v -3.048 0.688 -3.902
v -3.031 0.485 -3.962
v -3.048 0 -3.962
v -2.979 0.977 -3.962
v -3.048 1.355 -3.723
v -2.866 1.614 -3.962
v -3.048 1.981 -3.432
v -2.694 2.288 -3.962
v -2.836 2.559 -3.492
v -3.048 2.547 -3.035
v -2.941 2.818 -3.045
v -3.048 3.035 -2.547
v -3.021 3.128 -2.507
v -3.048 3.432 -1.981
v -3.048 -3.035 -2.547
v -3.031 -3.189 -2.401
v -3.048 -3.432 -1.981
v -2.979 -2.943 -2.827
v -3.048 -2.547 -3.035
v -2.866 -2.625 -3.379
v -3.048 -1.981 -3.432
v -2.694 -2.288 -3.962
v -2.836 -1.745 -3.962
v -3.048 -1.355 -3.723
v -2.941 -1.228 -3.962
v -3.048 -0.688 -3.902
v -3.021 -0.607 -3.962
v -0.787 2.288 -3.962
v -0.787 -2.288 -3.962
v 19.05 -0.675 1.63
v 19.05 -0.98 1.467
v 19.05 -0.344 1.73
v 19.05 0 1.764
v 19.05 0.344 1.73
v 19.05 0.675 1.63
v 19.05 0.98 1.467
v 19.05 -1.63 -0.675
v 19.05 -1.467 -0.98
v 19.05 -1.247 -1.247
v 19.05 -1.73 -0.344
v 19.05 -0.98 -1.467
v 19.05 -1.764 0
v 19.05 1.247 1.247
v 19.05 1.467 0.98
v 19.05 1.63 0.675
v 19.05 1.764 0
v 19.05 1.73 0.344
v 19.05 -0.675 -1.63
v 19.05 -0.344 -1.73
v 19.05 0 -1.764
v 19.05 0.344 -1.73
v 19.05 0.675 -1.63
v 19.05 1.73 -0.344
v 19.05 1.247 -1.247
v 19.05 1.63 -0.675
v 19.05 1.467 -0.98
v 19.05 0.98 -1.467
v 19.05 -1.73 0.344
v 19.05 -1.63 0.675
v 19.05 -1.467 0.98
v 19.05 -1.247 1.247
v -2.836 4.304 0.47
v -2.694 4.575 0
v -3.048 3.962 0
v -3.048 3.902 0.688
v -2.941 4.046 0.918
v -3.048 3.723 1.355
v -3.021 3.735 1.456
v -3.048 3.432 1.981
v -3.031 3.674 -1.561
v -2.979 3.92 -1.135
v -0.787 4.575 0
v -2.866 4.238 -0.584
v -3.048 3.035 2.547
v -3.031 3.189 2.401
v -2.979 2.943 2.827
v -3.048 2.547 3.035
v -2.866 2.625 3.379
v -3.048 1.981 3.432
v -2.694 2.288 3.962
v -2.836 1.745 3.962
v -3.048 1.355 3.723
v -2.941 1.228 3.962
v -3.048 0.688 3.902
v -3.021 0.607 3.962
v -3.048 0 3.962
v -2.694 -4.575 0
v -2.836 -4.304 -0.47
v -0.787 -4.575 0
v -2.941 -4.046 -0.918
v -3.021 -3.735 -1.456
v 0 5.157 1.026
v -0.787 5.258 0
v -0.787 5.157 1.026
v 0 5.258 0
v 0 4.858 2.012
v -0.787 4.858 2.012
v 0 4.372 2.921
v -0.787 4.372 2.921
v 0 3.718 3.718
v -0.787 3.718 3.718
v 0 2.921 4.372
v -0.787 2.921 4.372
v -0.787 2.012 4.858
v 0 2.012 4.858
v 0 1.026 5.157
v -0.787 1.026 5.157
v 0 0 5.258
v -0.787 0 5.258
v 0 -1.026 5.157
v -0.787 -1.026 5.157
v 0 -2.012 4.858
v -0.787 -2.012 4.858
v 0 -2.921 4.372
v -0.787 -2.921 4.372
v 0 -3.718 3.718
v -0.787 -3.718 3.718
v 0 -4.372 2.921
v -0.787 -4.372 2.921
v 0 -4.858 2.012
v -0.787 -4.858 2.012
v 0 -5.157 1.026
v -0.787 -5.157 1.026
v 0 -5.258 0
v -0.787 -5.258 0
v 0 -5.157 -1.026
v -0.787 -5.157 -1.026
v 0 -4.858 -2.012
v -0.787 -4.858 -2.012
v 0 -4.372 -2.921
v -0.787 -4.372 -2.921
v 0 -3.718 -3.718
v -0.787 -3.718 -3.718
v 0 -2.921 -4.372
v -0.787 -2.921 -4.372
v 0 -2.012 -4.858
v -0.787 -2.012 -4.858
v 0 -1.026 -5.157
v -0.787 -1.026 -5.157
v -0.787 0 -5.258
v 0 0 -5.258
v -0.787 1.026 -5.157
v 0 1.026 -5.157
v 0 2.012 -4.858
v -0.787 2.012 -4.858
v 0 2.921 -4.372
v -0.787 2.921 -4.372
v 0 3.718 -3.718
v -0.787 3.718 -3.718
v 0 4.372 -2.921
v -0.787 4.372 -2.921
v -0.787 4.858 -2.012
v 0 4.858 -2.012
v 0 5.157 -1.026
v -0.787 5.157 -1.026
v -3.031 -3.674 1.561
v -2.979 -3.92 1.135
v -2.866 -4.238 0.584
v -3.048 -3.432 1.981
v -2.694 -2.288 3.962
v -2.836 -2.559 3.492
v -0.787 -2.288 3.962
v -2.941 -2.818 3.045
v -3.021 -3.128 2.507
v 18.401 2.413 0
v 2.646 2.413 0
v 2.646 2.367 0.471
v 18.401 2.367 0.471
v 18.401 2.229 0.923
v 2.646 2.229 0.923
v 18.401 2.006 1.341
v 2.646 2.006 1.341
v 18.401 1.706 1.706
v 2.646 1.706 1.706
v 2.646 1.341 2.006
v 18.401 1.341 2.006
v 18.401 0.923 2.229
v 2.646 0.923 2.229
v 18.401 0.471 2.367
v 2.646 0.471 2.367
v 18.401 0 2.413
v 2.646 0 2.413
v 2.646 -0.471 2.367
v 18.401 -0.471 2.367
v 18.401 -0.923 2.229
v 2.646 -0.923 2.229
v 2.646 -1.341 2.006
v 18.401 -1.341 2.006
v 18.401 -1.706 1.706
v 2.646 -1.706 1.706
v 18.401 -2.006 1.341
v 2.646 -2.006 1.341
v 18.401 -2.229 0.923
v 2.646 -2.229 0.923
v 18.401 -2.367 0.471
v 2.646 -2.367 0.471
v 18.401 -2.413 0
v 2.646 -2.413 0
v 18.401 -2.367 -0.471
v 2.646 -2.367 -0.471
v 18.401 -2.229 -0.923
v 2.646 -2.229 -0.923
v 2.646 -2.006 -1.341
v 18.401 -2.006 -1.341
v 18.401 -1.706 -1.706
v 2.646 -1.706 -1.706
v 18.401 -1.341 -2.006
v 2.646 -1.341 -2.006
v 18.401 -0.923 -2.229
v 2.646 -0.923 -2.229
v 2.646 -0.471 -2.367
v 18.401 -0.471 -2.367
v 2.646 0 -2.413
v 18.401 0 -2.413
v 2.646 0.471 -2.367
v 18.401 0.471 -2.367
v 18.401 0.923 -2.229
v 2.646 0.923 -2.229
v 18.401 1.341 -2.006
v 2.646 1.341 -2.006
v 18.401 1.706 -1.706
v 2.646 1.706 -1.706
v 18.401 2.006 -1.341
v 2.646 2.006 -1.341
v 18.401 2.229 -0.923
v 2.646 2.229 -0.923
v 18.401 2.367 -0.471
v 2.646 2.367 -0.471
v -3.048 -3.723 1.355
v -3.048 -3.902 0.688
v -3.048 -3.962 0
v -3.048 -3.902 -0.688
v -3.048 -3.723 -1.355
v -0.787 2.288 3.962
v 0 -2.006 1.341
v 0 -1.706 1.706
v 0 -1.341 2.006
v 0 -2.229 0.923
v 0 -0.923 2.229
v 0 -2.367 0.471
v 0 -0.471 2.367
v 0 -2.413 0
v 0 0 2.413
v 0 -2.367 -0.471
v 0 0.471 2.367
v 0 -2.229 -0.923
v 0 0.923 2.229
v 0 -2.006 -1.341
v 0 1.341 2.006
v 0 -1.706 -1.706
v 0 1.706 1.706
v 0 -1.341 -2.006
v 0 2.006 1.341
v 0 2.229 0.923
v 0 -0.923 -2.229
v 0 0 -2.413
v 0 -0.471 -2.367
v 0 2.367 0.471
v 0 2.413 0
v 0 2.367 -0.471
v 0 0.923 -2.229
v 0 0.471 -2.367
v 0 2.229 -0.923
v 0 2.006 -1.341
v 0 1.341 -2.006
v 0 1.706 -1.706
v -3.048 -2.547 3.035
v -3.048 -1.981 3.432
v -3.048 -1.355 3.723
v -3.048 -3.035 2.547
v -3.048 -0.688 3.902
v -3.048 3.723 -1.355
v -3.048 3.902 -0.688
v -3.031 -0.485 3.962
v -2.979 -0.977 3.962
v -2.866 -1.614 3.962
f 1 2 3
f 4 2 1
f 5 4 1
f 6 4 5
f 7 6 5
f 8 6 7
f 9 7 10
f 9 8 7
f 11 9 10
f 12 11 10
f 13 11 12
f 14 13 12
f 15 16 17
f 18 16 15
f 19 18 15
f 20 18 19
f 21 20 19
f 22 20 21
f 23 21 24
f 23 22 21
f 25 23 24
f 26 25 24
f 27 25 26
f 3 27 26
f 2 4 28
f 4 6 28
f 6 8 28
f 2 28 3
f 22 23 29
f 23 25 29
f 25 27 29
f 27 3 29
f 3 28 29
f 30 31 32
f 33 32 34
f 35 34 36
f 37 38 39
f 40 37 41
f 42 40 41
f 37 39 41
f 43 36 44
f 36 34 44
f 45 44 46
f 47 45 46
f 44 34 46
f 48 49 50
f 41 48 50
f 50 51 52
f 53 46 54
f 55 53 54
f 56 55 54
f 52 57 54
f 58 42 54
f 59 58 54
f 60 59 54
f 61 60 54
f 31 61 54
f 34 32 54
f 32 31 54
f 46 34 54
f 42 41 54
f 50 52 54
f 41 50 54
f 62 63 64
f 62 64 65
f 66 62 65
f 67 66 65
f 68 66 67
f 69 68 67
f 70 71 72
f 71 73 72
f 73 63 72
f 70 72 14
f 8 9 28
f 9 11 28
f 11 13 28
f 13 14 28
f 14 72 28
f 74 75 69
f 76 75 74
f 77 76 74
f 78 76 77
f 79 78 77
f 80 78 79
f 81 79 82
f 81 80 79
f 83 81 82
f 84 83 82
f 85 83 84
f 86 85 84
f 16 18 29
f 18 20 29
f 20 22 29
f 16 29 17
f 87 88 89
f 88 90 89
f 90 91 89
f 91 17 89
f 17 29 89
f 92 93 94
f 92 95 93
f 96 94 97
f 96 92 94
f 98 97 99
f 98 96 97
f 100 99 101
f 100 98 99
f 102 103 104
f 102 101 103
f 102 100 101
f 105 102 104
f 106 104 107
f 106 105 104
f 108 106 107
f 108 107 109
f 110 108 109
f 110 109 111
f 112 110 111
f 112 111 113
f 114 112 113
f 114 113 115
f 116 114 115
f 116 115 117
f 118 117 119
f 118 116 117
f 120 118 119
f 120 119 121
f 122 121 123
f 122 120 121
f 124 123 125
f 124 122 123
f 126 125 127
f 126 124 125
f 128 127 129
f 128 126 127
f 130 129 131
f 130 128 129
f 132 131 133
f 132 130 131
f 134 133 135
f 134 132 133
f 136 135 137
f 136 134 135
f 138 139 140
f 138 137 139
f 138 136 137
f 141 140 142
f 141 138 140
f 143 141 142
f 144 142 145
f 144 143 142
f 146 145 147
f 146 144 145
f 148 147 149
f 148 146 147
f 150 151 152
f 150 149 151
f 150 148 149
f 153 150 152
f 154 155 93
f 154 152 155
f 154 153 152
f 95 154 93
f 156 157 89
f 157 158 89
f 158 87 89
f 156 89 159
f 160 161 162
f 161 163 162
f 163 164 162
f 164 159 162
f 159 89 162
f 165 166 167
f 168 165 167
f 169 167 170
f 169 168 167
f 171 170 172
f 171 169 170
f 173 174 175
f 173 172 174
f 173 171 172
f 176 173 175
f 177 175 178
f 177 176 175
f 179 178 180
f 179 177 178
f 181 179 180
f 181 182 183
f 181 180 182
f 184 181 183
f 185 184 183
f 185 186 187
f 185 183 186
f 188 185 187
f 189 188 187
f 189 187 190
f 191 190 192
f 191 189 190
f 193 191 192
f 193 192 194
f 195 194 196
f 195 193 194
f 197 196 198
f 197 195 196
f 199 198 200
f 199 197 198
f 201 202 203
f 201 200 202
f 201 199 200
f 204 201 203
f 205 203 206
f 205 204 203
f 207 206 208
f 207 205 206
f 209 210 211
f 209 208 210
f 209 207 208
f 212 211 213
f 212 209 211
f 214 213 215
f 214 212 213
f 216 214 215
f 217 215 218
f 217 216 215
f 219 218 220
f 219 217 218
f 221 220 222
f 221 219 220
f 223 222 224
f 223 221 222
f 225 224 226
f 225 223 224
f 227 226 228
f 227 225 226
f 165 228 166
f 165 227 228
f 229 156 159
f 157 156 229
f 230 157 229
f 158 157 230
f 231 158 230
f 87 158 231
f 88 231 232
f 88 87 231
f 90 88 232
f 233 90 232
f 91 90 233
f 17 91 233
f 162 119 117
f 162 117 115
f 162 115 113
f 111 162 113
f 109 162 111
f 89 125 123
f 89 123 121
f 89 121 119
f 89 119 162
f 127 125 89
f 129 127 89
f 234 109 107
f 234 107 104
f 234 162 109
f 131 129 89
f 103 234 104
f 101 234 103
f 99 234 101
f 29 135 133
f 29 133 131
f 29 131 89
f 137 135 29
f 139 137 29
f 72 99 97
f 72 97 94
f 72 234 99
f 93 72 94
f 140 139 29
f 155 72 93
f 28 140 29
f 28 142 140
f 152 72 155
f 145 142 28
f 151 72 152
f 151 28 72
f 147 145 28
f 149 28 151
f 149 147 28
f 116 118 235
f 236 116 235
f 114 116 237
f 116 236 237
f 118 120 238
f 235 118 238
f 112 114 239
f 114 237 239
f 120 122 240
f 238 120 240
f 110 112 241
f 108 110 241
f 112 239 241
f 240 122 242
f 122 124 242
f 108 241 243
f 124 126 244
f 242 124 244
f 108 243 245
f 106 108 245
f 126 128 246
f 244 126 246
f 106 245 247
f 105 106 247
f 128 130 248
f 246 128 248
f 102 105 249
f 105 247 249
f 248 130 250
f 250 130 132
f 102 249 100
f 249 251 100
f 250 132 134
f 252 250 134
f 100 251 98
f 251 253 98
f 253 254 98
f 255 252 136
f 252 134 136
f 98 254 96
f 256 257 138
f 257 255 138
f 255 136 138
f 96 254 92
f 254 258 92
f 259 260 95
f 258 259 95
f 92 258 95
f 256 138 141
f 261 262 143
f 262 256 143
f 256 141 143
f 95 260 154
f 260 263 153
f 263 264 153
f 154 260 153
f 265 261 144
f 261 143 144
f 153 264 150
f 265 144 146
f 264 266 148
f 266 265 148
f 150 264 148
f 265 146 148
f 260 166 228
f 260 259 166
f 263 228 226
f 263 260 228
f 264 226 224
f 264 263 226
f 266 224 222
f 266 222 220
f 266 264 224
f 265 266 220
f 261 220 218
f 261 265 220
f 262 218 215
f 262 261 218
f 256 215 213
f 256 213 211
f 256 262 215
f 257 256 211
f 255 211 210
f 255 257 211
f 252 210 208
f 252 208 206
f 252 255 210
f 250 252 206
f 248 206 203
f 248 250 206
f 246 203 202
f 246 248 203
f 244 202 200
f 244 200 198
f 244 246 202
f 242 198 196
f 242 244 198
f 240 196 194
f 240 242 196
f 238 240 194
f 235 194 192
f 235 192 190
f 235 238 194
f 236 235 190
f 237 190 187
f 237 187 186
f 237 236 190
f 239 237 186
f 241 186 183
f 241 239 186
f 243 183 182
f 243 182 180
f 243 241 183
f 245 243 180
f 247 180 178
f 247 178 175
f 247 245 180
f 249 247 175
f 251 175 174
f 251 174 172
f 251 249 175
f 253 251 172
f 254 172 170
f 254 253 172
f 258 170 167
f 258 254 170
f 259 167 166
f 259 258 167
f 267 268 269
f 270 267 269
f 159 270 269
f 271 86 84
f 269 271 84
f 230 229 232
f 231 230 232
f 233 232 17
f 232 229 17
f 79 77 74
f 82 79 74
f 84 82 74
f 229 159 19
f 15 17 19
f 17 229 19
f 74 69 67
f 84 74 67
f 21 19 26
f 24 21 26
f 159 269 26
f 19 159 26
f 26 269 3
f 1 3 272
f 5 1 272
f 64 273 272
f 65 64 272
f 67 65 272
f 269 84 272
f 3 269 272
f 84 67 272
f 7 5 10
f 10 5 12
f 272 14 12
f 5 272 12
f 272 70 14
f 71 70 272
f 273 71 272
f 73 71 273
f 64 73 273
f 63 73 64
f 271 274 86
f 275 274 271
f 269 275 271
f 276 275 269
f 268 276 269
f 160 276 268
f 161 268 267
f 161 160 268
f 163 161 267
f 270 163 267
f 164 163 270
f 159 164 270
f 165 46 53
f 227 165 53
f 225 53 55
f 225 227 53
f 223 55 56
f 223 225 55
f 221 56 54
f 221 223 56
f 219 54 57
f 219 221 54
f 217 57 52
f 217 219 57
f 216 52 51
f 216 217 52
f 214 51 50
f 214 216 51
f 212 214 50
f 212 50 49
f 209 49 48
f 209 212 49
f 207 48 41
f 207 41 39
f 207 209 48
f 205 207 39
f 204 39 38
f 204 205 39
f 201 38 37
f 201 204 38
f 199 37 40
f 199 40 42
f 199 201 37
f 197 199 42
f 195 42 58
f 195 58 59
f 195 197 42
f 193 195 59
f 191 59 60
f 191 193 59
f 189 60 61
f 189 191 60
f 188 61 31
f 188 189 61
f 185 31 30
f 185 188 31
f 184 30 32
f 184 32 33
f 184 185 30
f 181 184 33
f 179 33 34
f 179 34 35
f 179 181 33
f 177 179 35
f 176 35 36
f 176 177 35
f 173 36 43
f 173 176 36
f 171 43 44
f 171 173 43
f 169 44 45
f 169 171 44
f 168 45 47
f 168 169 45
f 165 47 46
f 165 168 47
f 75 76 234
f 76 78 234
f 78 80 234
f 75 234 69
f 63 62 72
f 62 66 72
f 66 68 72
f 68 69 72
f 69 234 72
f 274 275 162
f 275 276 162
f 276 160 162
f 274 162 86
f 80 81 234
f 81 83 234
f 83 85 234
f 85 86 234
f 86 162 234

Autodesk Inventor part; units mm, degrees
ref_plane "YZ Plane" through (0, 0, 0) normal (1, 0, 0) x (0, 1, 0)
ref_plane "XZ Plane" through (0, 0, 0) normal (0, 1, 0) x (-1, 0, 0)
sketch "Sketch1" plane through (0, 0, 0) normal (0, 0, 1) x (1, 0, 0)
  line L0 (0, 5.2578) -> (0, 2.413)
  line L1 (2.6458, 2.413) -> (19.05, 2.413)
  line L2 (19.05, 2.413) -> (19.05, 0)
  line L3 (19.05, 0) -> (-0.7874, 0)
  line L4 (0, -1.0516) -> (0, 6.3094) projected
  line L5 (-4.7549, 0) -> (23.0175, 0) projected
  line L6 (-0.7874, 0) -> (-0.7874, 5.2578)
  line L7 (-0.7874, 5.2578) -> (0, 5.2578)
  line L8 (2.6458, 2.413) -> (0, 2.413)
  line L9 (0, 2.413) -> (0, 2.413)
  dimension "d0" = 19.05
  dimension "d1" = 16.4042
  dimension "d2" = 4.826
  dimension "d8" = 0.7874
  dimension "d9" = 10.5156
  dimension "d15" = 4.826
  dimension "d16" = 2.6458
revolve "Body" add sketch "Sketch1" angle 360 about axis through (19.05, 0, 0) along (-1, 0, 0)
sketch "Sketch2" plane through (0, 0, 0) normal (1, 0, 0) x (0, 0, -1)
  circle A0 centre (0, 0) radius 5.2578 projected
  line L0 (0, 4.5754) -> (3.9624, 2.2877)
  line L1 (3.9624, 2.2877) -> (3.9624, -2.2877)
  line L2 (3.9624, -2.2877) -> (0, -4.5754)
  line L3 (0, -4.5754) -> (-3.9624, -2.2877)
  line L4 (-3.9624, -2.2877) -> (-3.9624, 2.2877)
  line L5 (-3.9624, 2.2877) -> (0, 4.5754)
  circle A1 centre (0, 0) radius 5.2578 projected
  dimension "d10" = 7.9248
extrude "Head" add sketch "Sketch2" against normal blind 3.048 contours L0 L1 L2 L3 L4 L5
sketch "Sketch3" plane through (0, 0, 0) normal (0, 0, 1) x (1, 0, 0)
  line L0 (-3.048, 3.9624) -> (-3.048, 4.5754)
  line L1 (-3.048, 4.5754) -> (-2.6941, 4.5754)
  line L2 (-2.6941, 4.5754) -> (-3.048, 3.9624)
  line L3 (-2.0219, 4.5754) -> (-3.048, 4.5754)
  line L4 (-3.048, 4.5754) -> (-3.048, 2.266)
  line L5 (-0.7874, 4.5754) -> (-3.048, 4.5754) projected
  line L6 (-3.048, 4.5754) -> (-3.048, 2.2877) projected
  line L7 (-3.5001, 0) -> (-0.3353, 0) projected
  dimension "d5" = 30
  dimension "d18" = 7.9248
revolve "Chamfer1" cut sketch "Sketch3" angle 360 about axis through (-10, 0, 0) along (1, 0, 0)
thread "Thread" size "10-24 UNC" class "2A" standard "ANSI Unified Screw Threads" length 16.4042
chamfer "Chamfer2" distance 0.6492 distance2 0.6492 1 edges at (19.05, -2.413, 0) measured on face at (19.05, -0.4919, 0.3738)
ref_plane "Work Plane1" through (3.5, 0, 0) normal (0, 0, 1) x (1, 0, 0)
equation "\"d10\" = SW"
equation "\"d3\" = KOH"
equation "\"d13\" = GEL"
equation "\"d6\" = -0.5 * SPD + 0.5 * GD"
equation "\"d7\" = -0.5 * SPD + 0.5 * GD"
equation "\"d0\" = NLG"
equation "\"d1\" = GEL"
equation "\"d2\" = GD"
equation "\"d8\" = PHH"
equation "\"d9\" = LADI"
equation "\"d15\" = BDM"
equation "\"d16\" = GAL"
equation "\"d5\" = ANG1"
equation "\"d18\" = SW0"
equation "\"NLG\" = 19.05"
equation "\"GD\" = NND"
equation "\"BDM\" = NND"
equation "\"KOH\" = 3.048"
equation "\"GEL\" = 16.40416"
equation "\"LADI\" = 10.5156"
equation "\"SW\" = 7.9248"
equation "\"PHH\" = 0.7874"
equation "\"SW0\" = 7.9248"
equation "\"SPD\" = GD1"
equation "\"ANG1\" = 30deg"
equation "\"GAL\" = 2.64584"
equation "\"GUL\" = GAL"
equation "\"GD1\" = 3.52753"
equation "\"THREADDIA\" = 4.826"
equation "\"SDH\" = SW"
equation "\"TOA\" = 30deg"
equation "\"RR\" = 0.04826"
equation "\"NND\" = 4.826"
equation "\"SD\" = 0"
equation "\"SD2\" = NND"
equation "\"E0\" = 8.636"
properties part number "ANSI B18.6.3 - 10-24 UNC x 0.75" material "Steel, Mild"
